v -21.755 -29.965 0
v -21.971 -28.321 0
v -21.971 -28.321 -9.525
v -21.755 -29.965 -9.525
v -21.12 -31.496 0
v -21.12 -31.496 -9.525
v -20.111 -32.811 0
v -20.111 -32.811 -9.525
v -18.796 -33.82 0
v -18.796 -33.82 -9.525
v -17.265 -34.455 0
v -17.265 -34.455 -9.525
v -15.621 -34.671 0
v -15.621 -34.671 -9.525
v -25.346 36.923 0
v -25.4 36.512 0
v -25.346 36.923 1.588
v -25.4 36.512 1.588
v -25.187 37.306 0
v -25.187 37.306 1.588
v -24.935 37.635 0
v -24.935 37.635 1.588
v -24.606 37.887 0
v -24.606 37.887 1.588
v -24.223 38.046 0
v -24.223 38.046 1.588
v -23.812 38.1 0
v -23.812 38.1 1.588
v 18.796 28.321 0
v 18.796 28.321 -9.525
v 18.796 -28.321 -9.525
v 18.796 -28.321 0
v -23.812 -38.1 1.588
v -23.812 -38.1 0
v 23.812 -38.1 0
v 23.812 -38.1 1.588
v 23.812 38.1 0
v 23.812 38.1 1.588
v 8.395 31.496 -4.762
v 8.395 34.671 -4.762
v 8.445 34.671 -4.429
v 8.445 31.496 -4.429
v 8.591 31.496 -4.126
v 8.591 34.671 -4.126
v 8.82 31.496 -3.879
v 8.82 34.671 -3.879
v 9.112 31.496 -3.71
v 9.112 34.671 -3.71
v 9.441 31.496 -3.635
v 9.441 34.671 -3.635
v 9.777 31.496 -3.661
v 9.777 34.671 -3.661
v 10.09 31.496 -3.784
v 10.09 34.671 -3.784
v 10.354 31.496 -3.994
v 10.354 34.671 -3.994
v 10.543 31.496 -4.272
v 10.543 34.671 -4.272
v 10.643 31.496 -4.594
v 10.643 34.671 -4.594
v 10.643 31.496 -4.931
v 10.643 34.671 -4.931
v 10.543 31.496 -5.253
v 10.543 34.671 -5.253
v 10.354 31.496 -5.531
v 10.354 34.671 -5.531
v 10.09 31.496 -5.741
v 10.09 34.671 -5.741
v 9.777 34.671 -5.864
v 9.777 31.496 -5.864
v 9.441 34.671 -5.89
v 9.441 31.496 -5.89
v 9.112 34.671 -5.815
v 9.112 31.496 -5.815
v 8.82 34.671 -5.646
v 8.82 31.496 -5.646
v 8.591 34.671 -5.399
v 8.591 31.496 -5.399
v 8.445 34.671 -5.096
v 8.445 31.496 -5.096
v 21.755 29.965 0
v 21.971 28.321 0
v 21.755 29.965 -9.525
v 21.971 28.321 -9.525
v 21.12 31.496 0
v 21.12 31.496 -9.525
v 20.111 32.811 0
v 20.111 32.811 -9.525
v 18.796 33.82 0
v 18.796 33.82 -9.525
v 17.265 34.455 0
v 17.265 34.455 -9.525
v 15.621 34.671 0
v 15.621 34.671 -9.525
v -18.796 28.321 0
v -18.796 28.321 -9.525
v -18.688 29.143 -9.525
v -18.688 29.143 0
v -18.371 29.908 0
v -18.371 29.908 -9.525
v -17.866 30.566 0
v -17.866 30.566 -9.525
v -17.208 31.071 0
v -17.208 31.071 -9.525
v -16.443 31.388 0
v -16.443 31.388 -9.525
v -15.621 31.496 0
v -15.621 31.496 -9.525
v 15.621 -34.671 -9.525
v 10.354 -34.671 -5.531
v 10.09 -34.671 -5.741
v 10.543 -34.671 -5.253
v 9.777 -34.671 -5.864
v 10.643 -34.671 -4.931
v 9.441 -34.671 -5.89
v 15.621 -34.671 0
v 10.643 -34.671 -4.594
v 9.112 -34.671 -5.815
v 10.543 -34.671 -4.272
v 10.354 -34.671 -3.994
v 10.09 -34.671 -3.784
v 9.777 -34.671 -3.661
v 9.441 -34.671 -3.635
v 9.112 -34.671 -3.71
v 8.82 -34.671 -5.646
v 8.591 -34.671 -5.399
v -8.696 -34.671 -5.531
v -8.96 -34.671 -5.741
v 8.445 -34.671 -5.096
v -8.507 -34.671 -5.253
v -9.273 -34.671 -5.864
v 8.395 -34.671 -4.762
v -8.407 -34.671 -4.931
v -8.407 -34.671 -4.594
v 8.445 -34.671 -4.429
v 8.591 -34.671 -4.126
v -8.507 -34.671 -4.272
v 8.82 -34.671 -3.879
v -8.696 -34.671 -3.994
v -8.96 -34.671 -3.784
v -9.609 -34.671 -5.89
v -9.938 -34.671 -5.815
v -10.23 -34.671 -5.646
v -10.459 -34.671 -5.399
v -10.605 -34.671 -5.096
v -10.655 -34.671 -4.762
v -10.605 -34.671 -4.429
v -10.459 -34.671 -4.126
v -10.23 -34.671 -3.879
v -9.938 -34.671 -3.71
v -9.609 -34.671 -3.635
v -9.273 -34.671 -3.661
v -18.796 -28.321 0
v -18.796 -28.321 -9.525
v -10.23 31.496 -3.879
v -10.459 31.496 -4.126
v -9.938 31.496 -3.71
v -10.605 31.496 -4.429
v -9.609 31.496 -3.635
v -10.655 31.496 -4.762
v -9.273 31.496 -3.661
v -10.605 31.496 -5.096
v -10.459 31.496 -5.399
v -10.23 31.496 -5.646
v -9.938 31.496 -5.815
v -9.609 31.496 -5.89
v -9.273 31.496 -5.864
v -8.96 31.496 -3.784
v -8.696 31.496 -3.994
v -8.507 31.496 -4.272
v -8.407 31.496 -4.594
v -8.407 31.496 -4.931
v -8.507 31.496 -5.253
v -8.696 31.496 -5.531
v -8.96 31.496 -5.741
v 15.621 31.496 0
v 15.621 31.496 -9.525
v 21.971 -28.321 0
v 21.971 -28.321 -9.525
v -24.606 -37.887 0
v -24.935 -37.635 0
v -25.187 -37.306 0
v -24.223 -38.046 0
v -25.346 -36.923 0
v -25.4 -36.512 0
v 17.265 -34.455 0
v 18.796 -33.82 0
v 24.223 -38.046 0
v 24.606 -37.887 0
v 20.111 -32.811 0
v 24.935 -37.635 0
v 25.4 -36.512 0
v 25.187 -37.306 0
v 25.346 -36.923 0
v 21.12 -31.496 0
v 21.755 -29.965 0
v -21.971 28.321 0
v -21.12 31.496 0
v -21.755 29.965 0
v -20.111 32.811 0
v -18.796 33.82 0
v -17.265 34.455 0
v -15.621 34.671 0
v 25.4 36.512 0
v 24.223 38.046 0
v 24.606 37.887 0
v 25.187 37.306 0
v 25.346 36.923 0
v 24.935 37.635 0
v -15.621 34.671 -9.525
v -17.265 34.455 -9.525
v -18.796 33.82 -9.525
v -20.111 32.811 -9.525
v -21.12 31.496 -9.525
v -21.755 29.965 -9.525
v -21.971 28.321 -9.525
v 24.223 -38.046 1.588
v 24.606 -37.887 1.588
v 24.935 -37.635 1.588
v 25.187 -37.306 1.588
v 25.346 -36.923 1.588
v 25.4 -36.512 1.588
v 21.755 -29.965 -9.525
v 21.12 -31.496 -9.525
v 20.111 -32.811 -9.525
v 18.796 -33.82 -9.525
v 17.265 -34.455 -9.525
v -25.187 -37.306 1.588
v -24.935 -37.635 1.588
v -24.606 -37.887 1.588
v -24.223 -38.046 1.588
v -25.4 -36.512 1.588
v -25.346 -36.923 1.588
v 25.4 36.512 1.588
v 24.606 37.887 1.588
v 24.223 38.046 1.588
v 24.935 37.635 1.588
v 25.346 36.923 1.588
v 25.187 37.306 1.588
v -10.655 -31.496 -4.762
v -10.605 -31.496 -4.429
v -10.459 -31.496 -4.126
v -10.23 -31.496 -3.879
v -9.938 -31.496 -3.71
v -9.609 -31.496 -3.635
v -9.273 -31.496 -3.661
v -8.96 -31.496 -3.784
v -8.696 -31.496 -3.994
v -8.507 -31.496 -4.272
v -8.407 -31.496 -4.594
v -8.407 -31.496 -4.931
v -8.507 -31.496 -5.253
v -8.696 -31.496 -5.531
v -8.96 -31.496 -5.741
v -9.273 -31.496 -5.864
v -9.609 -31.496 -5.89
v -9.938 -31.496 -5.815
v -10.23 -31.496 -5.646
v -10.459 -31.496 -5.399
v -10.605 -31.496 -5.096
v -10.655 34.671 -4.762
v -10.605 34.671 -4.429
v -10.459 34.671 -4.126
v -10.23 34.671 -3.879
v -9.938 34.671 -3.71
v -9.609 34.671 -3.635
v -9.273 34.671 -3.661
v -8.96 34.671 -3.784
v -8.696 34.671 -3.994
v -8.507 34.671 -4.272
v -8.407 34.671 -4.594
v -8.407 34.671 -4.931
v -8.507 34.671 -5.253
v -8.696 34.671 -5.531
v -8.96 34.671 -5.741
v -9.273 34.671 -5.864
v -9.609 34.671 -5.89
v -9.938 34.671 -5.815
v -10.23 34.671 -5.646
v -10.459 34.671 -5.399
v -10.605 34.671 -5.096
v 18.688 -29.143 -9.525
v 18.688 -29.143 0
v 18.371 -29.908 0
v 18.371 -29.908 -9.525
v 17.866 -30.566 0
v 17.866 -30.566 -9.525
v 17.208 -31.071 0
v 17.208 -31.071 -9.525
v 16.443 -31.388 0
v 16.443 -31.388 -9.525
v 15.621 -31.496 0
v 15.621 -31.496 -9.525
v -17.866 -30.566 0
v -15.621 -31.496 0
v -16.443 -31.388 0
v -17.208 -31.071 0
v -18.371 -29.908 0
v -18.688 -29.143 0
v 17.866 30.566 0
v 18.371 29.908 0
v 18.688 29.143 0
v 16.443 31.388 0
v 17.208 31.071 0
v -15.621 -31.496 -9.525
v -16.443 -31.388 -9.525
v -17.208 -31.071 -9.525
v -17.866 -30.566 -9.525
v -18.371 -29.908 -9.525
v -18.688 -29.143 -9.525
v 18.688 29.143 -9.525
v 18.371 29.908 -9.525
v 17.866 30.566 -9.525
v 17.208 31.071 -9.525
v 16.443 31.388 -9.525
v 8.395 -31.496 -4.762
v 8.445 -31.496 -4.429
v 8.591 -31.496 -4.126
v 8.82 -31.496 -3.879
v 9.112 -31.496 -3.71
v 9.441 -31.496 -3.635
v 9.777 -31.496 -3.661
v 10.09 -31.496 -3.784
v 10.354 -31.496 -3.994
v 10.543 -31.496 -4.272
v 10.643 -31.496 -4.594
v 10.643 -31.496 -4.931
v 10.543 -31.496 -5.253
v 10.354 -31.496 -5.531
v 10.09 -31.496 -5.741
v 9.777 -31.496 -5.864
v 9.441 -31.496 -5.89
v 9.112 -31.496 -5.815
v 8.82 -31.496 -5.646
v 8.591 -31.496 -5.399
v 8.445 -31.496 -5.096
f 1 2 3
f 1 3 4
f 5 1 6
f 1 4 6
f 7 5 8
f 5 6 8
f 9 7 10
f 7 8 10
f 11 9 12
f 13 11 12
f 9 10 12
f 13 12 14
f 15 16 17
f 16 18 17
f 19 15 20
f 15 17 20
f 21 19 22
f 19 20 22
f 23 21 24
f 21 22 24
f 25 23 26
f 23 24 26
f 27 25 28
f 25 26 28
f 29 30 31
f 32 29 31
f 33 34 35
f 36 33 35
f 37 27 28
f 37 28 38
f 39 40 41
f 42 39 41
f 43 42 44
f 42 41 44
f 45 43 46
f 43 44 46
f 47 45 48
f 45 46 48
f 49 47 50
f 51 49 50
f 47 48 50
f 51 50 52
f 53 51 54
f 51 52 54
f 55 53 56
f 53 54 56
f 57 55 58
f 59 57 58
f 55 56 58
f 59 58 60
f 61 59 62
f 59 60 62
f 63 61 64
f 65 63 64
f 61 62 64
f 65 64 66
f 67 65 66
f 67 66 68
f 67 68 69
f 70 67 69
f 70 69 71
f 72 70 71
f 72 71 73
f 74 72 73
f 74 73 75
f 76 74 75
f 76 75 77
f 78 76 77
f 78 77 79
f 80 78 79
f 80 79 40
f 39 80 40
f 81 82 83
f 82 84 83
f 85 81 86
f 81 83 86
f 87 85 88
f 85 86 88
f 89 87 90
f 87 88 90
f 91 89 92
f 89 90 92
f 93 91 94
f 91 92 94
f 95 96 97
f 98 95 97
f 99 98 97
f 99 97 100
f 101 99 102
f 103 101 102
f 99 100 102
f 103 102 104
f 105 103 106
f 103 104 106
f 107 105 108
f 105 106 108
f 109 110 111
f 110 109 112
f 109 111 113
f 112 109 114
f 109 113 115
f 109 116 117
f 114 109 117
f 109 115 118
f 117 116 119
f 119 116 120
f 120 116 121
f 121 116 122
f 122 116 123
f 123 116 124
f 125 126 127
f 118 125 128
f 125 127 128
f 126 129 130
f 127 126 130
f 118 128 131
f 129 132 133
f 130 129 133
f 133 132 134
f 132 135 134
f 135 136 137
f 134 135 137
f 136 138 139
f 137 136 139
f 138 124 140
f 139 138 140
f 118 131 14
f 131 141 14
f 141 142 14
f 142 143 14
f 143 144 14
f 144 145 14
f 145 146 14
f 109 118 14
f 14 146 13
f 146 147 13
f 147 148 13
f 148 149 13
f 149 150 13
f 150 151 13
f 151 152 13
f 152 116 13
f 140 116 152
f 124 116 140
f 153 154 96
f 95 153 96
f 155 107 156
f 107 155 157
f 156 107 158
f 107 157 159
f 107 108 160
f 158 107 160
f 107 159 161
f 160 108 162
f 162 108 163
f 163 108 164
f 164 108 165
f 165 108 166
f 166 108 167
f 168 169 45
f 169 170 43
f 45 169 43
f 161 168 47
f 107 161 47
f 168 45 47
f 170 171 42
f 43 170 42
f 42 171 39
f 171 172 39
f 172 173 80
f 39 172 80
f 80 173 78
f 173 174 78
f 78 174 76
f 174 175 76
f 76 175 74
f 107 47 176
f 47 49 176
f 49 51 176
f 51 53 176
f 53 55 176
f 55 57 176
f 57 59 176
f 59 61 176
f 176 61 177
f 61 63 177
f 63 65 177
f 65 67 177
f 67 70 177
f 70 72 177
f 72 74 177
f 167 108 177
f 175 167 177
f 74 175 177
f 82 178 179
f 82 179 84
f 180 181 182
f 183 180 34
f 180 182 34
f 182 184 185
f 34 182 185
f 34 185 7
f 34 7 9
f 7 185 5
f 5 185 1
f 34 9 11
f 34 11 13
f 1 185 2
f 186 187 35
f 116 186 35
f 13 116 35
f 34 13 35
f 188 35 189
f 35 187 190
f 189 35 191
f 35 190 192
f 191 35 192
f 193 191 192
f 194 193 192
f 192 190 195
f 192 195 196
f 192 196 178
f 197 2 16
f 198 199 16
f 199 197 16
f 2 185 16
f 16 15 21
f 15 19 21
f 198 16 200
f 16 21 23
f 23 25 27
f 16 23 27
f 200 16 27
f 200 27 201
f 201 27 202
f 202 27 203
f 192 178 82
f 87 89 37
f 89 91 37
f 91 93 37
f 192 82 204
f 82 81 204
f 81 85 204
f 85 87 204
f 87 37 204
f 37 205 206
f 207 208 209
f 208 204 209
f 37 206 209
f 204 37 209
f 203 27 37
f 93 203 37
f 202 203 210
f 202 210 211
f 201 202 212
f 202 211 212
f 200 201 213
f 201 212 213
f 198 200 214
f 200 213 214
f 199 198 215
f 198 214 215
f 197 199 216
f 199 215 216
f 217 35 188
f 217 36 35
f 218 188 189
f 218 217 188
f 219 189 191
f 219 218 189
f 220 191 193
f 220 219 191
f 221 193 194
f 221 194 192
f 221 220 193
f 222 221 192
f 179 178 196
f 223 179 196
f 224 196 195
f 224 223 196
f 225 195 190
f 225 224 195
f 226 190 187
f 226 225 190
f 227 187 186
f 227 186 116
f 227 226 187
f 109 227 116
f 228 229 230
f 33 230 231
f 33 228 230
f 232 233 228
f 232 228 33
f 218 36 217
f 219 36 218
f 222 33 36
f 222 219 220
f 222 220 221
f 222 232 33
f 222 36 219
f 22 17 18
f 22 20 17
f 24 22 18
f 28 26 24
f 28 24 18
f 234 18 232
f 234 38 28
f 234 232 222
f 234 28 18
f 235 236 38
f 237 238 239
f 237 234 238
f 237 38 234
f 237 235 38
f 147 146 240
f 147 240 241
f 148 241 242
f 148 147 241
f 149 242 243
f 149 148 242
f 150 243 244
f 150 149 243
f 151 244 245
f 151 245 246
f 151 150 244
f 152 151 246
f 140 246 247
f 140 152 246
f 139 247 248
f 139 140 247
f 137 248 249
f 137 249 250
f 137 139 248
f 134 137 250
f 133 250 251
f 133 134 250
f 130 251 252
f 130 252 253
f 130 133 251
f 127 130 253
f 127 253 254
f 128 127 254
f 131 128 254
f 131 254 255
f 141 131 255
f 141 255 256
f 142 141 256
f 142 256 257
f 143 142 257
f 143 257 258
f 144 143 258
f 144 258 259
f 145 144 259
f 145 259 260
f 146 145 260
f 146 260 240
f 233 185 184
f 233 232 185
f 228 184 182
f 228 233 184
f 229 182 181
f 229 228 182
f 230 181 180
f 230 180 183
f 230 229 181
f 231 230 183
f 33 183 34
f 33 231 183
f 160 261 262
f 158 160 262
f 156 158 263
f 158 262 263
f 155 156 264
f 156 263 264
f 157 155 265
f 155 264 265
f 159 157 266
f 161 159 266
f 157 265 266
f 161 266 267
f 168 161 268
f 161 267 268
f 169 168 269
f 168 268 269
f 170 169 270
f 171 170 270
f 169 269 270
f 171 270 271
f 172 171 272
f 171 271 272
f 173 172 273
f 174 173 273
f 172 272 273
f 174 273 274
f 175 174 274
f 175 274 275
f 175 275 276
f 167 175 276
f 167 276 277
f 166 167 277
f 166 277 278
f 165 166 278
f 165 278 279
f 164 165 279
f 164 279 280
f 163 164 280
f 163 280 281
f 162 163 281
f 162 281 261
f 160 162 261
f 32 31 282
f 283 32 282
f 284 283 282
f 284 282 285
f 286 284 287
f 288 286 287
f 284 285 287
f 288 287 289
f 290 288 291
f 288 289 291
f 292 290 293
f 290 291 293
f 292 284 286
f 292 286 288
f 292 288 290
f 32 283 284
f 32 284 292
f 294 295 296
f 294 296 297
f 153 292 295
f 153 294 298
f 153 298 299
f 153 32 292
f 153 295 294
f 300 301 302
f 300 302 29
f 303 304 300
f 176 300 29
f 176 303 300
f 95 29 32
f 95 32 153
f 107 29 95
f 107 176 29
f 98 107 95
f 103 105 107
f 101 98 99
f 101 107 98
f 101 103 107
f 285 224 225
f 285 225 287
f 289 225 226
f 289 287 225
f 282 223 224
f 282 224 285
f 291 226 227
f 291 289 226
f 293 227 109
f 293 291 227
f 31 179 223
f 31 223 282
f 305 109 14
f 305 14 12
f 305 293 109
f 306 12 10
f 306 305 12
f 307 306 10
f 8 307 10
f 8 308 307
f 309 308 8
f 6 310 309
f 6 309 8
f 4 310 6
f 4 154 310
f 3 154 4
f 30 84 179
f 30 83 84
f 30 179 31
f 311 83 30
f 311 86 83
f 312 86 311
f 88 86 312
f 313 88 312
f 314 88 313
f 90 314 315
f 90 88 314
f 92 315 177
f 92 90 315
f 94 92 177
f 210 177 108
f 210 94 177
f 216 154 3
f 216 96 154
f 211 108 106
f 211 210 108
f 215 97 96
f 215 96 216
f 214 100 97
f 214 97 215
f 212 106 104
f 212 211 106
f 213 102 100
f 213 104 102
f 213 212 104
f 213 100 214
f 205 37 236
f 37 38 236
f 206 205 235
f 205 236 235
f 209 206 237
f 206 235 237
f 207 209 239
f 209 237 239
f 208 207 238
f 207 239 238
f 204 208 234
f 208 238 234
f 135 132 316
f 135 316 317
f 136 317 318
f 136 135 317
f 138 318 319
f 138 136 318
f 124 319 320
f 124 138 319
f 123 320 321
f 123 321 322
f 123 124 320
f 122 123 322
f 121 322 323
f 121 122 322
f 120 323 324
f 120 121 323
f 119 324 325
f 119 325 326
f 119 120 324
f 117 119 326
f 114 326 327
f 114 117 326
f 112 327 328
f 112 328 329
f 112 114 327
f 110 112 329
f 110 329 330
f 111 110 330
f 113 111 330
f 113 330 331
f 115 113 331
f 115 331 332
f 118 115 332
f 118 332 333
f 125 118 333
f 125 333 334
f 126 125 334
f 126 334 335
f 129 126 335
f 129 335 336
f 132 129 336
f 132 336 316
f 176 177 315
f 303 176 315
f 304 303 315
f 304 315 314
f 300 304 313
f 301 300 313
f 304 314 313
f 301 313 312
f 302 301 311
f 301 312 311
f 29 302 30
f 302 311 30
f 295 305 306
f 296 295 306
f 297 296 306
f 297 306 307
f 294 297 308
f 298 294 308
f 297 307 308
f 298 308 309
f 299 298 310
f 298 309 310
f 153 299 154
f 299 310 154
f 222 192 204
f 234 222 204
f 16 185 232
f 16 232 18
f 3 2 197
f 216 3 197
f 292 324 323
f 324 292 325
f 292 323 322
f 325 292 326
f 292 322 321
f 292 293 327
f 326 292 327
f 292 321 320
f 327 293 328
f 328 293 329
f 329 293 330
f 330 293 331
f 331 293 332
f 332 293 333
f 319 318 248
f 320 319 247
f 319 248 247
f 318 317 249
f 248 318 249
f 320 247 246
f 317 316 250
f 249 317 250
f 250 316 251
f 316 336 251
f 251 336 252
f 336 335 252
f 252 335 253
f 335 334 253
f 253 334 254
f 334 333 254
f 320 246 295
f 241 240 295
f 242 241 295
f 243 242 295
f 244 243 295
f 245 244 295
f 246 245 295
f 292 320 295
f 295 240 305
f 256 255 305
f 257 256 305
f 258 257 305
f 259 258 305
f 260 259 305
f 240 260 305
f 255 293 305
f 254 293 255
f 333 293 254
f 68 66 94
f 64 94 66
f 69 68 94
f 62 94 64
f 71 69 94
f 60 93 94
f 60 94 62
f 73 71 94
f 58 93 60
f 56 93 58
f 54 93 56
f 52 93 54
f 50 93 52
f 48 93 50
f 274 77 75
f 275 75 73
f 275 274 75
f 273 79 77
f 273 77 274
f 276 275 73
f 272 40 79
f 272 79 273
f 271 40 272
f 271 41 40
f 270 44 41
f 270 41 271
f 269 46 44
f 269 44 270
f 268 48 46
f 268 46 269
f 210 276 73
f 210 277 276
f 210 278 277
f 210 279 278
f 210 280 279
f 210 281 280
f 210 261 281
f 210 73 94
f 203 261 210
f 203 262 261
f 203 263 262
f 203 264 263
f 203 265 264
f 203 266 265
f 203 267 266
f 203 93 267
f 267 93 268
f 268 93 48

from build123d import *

# Parameters (mm, degrees)
SKETCH1_W                  = 50.8
SKETCH1_H                  = 76.2
BOSS_EXTRUDE1_DEPTH        = 1.5875
SKETCH2_W                  = 43.942
SKETCH2_H                  = 69.342
BOSS_EXTRUDE2_DEPTH        = 9.525
FILLET1_R                  = 6.35
CUT_EXTRUDE1_DEPTH         = 9.525
F_4_40_TAPPED_HOLE1_REACH  = 79.663
F_4_40_TAPPED_HOLE1_BORE_R = 1.1303
FILLET2_R                  = 1.5875


with BuildPart() as part:
    # Sketch1 → Boss-Extrude1 (new body)
    with BuildSketch(Plane.XY):
        Rectangle(SKETCH1_W, SKETCH1_H)
    extrude(amount=BOSS_EXTRUDE1_DEPTH)

    # Sketch2 → Boss-Extrude2 (add)
    with BuildSketch(Plane(origin=(0, 0, 0), x_dir=(-1, 0, 0), z_dir=(0, 0, -1))):
        Rectangle(SKETCH2_W, SKETCH2_H)
    extrude(amount=BOSS_EXTRUDE2_DEPTH)

    # Fillet1
    fillet1_edges = [part.edges().sort_by_distance(p)[0] for p in [
        (-21.971, -34.671, -4.7625),
        (-21.971, 34.671, -4.7625),
        (21.971, 34.671, -4.7625),
        (21.971, -34.671, -4.7625),
    ]]
    fillet(fillet1_edges, radius=FILLET1_R)

    # Sketch3 → Cut-Extrude1 (cut)
    with BuildSketch(Plane(origin=(0, 0, -9.525), x_dir=(-1, 0, 0), z_dir=(0, 0, -1))):
        with BuildLine():
            Line((-18.796, 28.321), (-18.796, -28.321))
            ThreePointArc((-18.796, -28.321), (-17.86606403, -30.56606403), (-15.621, -31.496))
            Line((-15.621, -31.496), (15.621, -31.496))
            ThreePointArc((15.621, -31.496), (17.86606403, -30.56606403), (18.796, -28.321))
            Line((18.796, -28.321), (18.796, 28.321))
            ThreePointArc((18.796, 28.321), (17.86606403, 30.56606403), (15.621, 31.496))
            Line((15.621, 31.496), (-15.621, 31.496))
            ThreePointArc((-15.621, 31.496), (-17.86606403, 30.56606403), (-18.796, 28.321))
        make_face()
    extrude(amount=-CUT_EXTRUDE1_DEPTH, mode=Mode.SUBTRACT)

    # #4-40 Tapped Hole1 bore → #4-40 Tapped Hole1 (cut, up to next)
    with BuildSketch(Plane(origin=(0, 34.671, 0), x_dir=(-1, 0, 0), z_dir=(0, 1, 0)), mode=Mode.PRIVATE) as f_4_40_tapped_hole1_sk1:
        with Locations((-9.525, -4.7625)):
            Circle(F_4_40_TAPPED_HOLE1_BORE_R)
    f_4_40_tapped_hole1_tool1 = extrude(f_4_40_tapped_hole1_sk1.sketch, amount=-F_4_40_TAPPED_HOLE1_REACH, mode=Mode.PRIVATE) & part.part
    # #4-40 Tapped Hole1 bore → #4-40 Tapped Hole1 (cut, up to next)
    with BuildSketch(Plane(origin=(0, 34.671, 0), x_dir=(-1, 0, 0), z_dir=(0, 1, 0)), mode=Mode.PRIVATE) as f_4_40_tapped_hole1_sk2:
        with Locations((9.525, -4.7625)):
            Circle(F_4_40_TAPPED_HOLE1_BORE_R)
    f_4_40_tapped_hole1_tool2 = extrude(f_4_40_tapped_hole1_sk2.sketch, amount=-F_4_40_TAPPED_HOLE1_REACH, mode=Mode.PRIVATE) & part.part
    f_4_40_tapped_hole1_1 = f_4_40_tapped_hole1_tool1.solids().sort_by_distance((9.525, 34.671, -4.7625))[0]
    add(f_4_40_tapped_hole1_1, mode=Mode.SUBTRACT)
    f_4_40_tapped_hole1_2 = f_4_40_tapped_hole1_tool2.solids().sort_by_distance((-9.525, 34.671, -4.7625))[0]
    add(f_4_40_tapped_hole1_2, mode=Mode.SUBTRACT)
    f_4_40_tapped_hole1 = f_4_40_tapped_hole1_1 + f_4_40_tapped_hole1_2  # #4-40 Tapped Hole1 as one shape, for the pattern or mirror that repeats it

    # Mirror1: #4-40 Tapped Hole1 across plane
    add(f_4_40_tapped_hole1.mirror(Plane.ZX), mode=Mode.SUBTRACT)

    # Fillet2
    fillet2_edges = [part.edges().sort_by_distance(p)[0] for p in [
        (25.4, -38.1, 0.79375),
        (-25.4, -38.1, 0.79375),
        (-25.4, 38.1, 0.79375),
        (25.4, 38.1, 0.79375),
    ]]
    fillet(fillet2_edges, radius=FILLET2_R)


solid = part.part
